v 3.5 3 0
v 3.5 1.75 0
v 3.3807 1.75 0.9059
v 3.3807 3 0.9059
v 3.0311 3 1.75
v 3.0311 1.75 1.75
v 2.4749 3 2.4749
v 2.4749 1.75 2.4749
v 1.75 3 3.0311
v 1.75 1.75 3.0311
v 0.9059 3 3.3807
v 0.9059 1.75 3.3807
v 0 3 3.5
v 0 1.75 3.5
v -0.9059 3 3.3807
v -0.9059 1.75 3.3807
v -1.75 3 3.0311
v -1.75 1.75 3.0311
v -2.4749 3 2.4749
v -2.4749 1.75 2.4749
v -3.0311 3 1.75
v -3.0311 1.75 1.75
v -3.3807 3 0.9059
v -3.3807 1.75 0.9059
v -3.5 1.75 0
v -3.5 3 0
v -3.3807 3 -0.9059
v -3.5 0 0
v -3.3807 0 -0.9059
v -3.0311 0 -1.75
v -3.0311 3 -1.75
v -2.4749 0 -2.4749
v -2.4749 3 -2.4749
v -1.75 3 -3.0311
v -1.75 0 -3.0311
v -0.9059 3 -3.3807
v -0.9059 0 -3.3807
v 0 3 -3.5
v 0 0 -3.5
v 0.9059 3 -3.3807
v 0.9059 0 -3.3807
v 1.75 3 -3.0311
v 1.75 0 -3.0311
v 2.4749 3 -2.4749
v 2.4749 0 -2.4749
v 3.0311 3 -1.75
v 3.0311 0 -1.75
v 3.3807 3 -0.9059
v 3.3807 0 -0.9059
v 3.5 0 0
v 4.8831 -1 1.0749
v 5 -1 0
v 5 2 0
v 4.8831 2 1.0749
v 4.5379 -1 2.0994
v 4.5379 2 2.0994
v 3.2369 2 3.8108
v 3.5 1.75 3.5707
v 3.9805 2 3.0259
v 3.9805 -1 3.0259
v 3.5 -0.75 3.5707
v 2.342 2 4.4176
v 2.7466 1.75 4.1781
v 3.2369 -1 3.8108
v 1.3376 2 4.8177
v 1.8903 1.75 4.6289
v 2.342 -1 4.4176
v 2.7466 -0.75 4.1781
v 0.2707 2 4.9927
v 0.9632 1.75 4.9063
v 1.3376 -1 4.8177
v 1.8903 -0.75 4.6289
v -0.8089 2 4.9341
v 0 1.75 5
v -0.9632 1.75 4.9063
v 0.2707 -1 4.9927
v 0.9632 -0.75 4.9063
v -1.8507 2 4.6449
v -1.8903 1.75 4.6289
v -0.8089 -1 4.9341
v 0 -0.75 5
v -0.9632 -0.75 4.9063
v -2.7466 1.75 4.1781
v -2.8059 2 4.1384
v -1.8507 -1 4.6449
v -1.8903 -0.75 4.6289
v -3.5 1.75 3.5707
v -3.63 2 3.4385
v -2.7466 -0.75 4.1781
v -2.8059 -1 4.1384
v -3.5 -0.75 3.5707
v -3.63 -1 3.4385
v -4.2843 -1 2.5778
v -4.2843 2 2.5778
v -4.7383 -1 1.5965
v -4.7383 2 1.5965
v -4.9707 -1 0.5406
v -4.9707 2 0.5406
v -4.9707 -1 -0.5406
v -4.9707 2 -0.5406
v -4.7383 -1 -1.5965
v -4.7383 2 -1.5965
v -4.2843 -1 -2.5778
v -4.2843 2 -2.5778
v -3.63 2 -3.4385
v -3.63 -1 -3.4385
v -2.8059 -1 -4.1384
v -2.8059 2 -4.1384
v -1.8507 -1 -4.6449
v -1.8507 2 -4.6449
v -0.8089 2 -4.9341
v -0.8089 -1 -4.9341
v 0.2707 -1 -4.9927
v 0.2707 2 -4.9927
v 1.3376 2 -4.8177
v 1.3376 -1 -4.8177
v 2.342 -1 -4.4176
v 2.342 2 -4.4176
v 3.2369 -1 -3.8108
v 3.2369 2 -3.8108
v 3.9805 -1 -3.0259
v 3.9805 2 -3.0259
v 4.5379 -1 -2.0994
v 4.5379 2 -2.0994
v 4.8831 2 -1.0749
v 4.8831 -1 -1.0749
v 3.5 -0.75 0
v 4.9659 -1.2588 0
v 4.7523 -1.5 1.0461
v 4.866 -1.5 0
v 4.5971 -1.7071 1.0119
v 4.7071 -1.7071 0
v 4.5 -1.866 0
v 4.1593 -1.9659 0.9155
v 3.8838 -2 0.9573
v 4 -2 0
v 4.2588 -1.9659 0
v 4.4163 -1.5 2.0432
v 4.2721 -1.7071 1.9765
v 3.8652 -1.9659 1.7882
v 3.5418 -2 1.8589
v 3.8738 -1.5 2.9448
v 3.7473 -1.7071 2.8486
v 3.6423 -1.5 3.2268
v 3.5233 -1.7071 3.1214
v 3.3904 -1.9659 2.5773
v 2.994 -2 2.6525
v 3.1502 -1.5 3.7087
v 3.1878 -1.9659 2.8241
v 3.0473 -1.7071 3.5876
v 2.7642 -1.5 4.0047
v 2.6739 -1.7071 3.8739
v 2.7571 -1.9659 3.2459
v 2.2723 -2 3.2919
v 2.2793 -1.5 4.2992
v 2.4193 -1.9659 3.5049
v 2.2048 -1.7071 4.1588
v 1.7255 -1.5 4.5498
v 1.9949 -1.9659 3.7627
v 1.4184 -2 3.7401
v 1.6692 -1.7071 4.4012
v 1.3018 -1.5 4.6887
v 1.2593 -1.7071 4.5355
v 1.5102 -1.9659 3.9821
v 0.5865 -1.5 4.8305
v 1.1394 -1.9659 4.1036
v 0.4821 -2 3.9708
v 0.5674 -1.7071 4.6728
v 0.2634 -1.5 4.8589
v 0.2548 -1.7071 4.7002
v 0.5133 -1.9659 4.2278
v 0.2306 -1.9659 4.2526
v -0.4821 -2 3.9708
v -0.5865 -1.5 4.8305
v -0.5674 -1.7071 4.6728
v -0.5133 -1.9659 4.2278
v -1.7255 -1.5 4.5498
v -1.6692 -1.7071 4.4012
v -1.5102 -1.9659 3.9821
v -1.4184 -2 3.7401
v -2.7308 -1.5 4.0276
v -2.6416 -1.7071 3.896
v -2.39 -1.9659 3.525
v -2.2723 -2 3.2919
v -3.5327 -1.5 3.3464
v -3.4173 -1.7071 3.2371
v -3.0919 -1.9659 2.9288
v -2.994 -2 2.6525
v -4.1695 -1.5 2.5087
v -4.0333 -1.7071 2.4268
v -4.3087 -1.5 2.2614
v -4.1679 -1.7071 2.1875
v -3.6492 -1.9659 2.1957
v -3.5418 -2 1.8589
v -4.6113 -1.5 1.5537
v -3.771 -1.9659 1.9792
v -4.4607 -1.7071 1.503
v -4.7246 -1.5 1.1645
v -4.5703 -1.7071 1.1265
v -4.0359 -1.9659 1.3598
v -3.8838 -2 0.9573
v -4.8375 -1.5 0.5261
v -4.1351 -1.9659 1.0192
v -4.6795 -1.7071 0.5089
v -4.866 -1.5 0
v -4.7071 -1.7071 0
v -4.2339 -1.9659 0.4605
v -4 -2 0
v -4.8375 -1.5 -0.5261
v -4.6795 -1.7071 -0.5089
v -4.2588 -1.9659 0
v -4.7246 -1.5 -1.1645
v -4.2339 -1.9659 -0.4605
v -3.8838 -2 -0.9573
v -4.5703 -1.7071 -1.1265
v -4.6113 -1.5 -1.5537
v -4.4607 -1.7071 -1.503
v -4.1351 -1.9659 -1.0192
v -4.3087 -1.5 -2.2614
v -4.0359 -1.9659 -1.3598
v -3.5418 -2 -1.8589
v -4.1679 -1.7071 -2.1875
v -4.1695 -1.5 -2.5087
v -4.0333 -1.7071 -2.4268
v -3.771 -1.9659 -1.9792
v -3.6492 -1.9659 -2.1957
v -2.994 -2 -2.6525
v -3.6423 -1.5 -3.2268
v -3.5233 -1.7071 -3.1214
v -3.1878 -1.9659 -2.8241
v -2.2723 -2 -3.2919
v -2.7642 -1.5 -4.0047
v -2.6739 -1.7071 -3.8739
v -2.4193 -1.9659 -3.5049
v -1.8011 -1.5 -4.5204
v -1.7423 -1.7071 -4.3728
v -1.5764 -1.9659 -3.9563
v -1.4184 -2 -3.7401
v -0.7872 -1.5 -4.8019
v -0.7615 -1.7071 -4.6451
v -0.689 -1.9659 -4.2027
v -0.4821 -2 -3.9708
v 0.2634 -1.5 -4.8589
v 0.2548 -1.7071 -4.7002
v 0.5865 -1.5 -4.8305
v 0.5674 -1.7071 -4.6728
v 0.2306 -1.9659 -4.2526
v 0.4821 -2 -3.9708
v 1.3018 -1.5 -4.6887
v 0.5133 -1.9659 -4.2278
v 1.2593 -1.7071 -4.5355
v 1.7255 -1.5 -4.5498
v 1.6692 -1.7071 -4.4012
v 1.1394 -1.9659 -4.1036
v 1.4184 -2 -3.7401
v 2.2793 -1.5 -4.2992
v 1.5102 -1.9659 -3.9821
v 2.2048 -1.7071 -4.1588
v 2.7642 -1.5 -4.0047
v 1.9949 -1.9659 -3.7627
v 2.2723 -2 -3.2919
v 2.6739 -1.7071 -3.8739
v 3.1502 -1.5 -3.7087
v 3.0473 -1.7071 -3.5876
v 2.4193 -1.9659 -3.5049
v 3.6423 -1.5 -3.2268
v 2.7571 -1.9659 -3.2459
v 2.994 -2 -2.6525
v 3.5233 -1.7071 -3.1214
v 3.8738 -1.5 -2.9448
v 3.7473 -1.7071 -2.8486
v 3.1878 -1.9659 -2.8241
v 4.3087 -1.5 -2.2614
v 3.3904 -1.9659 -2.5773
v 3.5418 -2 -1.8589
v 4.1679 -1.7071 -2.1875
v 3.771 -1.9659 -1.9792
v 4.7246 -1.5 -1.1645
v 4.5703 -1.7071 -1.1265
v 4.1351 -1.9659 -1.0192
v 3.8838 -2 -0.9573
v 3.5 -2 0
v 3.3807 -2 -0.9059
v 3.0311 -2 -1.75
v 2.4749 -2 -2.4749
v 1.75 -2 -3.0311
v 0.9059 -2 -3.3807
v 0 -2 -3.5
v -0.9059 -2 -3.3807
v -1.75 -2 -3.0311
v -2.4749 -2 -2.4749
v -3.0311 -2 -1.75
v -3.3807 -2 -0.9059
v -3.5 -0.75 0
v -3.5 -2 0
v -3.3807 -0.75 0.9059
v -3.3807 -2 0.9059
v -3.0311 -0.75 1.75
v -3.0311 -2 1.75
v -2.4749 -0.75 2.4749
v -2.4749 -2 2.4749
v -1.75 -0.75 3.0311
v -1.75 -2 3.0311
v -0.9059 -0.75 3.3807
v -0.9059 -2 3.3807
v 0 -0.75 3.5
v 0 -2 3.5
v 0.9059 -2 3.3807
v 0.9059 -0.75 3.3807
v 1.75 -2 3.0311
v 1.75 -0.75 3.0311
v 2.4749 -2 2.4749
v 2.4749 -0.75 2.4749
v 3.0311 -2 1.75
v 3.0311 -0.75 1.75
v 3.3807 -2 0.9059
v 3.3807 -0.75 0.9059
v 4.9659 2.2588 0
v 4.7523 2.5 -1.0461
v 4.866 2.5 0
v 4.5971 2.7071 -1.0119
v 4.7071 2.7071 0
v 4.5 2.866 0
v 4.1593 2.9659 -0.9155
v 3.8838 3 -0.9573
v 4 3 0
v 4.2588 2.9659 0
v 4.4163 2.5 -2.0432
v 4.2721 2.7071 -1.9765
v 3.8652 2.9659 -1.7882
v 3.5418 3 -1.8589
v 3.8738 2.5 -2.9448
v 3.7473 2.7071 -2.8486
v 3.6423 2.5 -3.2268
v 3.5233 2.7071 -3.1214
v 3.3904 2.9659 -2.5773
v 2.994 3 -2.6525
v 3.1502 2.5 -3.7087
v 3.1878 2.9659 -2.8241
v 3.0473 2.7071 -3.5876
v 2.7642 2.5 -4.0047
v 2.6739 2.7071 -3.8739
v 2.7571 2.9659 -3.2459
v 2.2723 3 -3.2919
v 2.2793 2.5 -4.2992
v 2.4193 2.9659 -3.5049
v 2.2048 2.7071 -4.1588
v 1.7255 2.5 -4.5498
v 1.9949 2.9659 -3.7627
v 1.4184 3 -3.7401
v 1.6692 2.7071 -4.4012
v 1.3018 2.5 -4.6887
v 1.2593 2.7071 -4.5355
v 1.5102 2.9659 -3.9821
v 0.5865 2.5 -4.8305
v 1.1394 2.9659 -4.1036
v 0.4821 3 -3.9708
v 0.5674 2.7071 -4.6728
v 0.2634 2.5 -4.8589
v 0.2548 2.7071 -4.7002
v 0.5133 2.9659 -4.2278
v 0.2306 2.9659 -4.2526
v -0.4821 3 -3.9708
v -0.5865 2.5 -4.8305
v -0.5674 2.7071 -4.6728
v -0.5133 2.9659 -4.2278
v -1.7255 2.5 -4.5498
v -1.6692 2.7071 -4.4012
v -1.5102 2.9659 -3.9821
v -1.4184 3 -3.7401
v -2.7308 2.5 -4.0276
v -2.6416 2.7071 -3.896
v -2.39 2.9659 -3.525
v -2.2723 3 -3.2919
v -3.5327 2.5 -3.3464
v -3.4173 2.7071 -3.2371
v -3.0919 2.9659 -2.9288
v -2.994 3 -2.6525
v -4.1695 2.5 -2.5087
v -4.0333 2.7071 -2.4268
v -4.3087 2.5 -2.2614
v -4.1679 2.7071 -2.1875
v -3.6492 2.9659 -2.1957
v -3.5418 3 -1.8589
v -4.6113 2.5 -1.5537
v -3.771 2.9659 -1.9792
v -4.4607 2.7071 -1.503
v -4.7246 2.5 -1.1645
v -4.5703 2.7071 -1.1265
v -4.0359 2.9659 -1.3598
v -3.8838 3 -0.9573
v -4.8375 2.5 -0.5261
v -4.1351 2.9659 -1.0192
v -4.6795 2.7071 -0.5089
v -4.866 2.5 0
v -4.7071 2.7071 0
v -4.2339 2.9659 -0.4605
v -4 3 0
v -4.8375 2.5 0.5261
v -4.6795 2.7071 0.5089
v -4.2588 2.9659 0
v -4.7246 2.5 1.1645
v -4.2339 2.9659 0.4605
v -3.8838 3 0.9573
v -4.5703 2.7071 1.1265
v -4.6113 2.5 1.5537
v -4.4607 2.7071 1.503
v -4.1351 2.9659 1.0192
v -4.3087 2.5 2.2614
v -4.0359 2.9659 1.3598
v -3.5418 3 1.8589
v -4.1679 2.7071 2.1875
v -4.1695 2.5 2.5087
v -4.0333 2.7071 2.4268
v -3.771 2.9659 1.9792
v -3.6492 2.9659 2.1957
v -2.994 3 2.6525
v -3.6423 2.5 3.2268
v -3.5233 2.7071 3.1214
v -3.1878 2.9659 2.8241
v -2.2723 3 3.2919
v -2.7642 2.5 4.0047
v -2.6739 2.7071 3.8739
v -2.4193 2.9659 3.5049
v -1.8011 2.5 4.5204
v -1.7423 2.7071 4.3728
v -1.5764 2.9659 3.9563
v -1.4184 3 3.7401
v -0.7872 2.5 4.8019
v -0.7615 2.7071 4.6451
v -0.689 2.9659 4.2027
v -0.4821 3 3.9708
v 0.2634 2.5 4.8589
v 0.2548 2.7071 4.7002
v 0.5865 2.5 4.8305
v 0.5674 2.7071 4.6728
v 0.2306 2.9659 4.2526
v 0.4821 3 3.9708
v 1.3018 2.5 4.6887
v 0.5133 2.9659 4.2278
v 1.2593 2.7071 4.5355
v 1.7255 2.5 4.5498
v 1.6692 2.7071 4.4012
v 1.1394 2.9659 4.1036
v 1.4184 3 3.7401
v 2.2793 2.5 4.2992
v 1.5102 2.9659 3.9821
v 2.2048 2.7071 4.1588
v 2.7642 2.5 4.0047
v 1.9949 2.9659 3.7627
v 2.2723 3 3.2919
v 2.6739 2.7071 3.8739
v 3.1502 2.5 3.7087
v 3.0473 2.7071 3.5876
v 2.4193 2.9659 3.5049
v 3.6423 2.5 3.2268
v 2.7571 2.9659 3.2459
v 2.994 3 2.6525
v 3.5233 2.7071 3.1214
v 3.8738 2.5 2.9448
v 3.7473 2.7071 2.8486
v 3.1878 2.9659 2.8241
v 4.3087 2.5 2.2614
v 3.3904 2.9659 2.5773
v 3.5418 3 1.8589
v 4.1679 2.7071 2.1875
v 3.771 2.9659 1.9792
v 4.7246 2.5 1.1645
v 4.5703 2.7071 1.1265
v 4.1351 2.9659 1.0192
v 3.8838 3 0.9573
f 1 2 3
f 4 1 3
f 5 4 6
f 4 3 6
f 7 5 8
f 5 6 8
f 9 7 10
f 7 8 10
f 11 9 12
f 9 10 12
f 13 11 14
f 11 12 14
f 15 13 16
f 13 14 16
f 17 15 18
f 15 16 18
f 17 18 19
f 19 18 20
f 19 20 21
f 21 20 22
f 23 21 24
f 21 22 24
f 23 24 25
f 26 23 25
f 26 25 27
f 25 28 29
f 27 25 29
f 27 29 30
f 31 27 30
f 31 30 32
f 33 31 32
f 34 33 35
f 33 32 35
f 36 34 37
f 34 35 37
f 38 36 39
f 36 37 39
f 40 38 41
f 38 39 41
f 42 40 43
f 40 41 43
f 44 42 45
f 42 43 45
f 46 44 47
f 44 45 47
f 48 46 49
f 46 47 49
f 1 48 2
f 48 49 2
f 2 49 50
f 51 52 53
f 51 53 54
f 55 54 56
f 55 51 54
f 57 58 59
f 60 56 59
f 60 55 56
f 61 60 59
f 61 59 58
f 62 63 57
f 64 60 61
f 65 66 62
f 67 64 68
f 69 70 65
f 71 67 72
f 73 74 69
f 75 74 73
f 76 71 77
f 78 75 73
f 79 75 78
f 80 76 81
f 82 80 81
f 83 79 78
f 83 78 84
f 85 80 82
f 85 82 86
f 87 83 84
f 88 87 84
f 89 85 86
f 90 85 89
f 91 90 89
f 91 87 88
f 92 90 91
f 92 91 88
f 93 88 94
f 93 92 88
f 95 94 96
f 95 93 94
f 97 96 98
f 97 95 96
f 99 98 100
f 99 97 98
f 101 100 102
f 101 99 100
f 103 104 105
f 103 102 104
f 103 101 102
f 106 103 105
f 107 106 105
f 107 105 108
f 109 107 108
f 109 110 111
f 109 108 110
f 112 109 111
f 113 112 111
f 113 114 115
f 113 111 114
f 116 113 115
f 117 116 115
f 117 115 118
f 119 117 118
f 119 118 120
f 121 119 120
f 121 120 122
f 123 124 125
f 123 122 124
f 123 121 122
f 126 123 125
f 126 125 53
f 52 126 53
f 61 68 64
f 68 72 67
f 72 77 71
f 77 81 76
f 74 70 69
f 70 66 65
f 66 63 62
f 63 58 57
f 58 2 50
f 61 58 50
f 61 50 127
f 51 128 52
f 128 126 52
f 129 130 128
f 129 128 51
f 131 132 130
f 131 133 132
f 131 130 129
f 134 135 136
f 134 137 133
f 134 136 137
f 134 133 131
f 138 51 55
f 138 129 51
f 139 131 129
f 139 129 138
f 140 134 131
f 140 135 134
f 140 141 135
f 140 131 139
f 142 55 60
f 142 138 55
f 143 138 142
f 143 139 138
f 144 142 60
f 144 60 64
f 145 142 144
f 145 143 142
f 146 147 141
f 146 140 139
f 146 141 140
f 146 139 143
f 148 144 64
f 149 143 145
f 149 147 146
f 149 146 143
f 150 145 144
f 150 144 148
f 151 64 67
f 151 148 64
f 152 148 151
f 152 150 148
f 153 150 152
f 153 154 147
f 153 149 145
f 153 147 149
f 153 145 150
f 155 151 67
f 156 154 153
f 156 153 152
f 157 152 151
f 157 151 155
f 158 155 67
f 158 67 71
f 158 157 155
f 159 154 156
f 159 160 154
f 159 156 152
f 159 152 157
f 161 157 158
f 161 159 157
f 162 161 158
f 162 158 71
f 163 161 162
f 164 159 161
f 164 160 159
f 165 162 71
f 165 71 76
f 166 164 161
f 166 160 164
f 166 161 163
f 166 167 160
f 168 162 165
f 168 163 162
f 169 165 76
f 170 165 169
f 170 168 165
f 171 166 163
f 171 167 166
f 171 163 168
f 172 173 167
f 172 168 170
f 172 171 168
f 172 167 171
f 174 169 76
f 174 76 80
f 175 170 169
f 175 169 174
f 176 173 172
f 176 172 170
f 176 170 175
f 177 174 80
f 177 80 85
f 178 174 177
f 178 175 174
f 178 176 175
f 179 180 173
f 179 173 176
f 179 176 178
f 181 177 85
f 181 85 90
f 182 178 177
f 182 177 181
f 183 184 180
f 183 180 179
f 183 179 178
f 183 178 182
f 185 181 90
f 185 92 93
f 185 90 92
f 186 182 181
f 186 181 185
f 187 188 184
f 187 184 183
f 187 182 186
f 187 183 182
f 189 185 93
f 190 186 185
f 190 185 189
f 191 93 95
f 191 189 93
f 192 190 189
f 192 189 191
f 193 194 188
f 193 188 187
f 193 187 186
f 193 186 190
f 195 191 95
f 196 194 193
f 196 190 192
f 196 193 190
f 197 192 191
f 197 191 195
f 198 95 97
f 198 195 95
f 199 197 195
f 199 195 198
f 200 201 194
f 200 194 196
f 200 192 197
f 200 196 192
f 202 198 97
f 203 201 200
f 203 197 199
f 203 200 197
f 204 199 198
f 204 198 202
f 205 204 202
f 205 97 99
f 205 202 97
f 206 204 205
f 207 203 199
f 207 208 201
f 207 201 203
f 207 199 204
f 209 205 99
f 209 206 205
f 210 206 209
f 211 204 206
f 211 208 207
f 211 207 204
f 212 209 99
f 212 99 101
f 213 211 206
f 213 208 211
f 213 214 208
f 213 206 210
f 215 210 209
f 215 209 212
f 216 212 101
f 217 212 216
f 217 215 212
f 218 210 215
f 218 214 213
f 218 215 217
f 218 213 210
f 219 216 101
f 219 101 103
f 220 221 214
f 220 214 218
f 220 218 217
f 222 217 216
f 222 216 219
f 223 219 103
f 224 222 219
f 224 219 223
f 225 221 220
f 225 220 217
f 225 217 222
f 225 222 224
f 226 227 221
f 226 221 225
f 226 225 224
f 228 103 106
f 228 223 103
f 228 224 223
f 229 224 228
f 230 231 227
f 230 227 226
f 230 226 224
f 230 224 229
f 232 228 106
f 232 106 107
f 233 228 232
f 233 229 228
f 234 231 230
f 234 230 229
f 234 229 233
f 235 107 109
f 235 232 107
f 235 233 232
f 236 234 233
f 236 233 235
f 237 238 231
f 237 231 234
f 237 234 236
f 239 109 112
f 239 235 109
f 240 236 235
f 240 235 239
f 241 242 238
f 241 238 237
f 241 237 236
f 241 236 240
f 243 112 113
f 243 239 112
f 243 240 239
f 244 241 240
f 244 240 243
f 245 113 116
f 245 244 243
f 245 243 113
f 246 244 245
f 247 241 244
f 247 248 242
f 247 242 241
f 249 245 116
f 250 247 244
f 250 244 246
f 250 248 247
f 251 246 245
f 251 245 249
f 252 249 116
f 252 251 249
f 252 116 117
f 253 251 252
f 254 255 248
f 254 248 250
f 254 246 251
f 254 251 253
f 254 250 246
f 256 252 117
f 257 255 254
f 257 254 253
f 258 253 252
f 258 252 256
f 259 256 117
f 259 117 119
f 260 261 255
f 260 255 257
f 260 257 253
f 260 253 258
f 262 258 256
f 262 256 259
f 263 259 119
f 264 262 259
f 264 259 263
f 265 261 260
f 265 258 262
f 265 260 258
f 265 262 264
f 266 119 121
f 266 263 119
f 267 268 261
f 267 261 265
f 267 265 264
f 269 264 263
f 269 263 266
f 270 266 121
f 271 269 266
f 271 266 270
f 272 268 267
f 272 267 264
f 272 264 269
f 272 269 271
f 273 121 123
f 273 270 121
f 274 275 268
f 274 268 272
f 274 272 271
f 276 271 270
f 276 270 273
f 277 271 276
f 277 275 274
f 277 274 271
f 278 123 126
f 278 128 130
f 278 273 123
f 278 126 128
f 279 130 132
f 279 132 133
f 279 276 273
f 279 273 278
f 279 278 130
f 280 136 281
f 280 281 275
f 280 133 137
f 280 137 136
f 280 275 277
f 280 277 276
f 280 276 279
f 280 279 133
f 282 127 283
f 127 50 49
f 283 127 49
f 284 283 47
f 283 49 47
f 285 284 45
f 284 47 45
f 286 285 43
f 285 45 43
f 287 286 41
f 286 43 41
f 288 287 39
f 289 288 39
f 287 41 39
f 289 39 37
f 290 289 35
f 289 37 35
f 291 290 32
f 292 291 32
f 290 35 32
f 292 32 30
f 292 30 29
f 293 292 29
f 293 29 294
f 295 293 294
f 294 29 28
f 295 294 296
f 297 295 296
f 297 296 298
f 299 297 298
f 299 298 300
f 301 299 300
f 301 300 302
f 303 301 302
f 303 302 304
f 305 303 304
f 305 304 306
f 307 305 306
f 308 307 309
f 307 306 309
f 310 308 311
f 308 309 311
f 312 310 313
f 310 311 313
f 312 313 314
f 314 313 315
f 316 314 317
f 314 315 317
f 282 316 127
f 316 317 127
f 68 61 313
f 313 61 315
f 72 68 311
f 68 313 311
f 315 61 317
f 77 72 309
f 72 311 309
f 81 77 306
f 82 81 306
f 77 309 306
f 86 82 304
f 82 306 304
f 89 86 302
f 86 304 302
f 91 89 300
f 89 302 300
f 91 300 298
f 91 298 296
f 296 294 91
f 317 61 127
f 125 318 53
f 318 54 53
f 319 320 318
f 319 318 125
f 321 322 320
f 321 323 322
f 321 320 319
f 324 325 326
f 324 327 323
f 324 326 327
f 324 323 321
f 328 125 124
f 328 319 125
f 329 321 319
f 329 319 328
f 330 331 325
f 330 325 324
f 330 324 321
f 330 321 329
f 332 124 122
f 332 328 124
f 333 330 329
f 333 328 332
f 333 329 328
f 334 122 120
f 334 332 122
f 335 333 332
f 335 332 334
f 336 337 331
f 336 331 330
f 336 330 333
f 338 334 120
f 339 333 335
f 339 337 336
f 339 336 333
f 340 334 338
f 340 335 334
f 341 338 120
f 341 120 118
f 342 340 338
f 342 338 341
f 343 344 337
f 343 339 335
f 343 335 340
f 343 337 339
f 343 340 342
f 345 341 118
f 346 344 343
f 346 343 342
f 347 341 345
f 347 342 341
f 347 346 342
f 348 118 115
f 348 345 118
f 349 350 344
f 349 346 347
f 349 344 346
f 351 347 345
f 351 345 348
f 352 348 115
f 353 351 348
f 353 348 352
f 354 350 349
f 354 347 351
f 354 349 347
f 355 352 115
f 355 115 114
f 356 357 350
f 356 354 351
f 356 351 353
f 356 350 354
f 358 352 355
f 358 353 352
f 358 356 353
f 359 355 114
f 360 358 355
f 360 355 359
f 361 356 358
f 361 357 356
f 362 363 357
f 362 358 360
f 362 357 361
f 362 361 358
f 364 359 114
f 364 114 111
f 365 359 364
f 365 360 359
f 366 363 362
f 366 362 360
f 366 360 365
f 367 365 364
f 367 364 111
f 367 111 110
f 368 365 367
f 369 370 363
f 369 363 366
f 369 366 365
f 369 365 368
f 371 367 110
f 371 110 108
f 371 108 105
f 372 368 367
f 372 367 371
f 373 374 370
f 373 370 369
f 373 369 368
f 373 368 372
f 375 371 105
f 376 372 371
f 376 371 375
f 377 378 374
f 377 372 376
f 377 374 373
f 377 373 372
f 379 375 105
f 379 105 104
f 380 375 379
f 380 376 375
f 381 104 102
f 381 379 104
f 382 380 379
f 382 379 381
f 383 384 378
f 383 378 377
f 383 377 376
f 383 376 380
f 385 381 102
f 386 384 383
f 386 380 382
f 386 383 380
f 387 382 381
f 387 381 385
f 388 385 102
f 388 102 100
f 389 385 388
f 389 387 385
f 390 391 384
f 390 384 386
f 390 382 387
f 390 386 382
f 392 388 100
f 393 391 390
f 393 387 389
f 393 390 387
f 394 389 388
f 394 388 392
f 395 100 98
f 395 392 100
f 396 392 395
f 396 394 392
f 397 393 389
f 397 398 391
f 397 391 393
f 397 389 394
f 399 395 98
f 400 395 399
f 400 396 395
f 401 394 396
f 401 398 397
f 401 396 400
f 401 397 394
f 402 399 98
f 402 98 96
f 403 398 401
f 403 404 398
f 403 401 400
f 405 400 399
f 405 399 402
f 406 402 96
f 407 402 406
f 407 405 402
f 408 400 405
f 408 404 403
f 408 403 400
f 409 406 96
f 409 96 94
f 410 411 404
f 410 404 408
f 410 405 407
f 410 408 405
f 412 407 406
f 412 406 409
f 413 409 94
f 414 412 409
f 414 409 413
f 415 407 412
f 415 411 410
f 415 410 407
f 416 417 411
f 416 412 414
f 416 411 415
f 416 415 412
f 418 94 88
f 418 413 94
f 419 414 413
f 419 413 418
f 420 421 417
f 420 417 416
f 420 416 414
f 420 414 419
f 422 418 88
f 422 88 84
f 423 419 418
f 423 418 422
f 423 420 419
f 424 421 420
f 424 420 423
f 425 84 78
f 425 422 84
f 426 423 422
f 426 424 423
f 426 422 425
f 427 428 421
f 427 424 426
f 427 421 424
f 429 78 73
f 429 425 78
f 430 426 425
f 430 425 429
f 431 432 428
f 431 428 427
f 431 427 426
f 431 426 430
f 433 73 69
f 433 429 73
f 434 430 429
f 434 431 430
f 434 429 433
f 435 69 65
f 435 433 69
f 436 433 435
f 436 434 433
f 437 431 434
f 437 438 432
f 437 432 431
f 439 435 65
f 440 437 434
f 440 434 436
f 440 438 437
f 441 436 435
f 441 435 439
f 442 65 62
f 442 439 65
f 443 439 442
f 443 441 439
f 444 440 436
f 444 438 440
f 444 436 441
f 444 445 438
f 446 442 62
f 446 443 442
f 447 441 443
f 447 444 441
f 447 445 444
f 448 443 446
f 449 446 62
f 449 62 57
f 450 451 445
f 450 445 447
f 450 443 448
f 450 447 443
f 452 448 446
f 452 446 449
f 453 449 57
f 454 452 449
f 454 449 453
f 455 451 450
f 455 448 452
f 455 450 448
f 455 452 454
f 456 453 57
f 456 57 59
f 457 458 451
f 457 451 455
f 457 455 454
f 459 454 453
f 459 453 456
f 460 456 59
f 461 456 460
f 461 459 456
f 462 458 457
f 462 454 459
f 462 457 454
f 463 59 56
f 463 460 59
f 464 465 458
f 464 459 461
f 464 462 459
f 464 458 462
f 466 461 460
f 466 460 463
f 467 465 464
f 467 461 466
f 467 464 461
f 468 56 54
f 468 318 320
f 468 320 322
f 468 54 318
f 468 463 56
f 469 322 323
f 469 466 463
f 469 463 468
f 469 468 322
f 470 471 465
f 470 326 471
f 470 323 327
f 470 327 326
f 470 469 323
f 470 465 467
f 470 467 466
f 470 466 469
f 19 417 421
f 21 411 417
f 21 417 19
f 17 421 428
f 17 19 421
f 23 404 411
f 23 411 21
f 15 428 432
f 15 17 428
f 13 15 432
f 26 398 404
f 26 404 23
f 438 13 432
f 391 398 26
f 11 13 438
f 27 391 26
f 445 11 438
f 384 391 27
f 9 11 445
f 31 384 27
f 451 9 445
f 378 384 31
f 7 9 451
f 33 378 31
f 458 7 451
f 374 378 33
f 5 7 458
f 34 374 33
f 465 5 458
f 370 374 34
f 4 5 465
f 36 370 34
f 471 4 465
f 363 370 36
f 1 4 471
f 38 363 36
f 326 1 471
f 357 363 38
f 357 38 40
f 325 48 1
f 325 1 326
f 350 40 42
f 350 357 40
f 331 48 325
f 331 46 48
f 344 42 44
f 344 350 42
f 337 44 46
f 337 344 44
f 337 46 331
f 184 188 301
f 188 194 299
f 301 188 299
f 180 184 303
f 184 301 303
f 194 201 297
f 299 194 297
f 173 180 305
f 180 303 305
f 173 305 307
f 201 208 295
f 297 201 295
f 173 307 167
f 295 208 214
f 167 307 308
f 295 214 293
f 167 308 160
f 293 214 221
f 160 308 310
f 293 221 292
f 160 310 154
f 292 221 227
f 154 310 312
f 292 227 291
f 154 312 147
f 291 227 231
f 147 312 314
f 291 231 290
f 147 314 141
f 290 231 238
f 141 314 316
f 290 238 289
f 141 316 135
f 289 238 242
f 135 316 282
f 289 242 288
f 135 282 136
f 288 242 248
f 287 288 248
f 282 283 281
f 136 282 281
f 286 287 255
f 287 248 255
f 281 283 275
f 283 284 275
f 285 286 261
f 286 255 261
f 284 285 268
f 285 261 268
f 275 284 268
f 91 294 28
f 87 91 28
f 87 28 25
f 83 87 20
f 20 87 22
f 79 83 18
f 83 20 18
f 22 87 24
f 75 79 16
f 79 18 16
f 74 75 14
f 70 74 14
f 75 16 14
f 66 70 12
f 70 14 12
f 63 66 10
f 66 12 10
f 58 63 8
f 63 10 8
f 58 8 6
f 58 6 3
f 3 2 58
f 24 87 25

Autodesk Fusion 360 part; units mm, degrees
sketch "Sketch1" plane through (0, 0, 0) normal (0, 1, 0) x (1, 0, 0)
  circle A0 centre (0, 0) radius 3.5
  circle A1 centre (0, 0) radius 5
  dimension "d1" = 7
  dimension "d2" = 10
extrude "Extrude1" add sketch "Sketch1" along normal blind 3 and the other way blind 2
sketch "Sketch2" plane through (0, 0, 0) normal (0, 0, 1) x (1, 0, 0)
  line L0 (3.5, -0.75) -> (-3.5, -0.75)
  line L1 (-3.5, -0.75) -> (-3.5, 1.75)
  line L2 (-3.5, 1.75) -> (3.5, 1.75)
  line L3 (3.5, 1.75) -> (3.5, -0.75)
  line L4 (0, 0) -> (-3.5, 0)
  line L5 (0, 0) -> (0, 1.75)
  dimension "d7" = 7
  dimension "d8" = 2.5
  dimension "d15" = 3.5
  dimension "d16" = 1.75
extrude "Extrude2" cut sketch "Sketch2" along normal blind 5
fillet "Fillet1" radius 1 1 edges at (-4.6616, 3, 1.8081)
fillet "Fillet2" radius 1 1 edges at (-4.6616, -2, -1.8081)
